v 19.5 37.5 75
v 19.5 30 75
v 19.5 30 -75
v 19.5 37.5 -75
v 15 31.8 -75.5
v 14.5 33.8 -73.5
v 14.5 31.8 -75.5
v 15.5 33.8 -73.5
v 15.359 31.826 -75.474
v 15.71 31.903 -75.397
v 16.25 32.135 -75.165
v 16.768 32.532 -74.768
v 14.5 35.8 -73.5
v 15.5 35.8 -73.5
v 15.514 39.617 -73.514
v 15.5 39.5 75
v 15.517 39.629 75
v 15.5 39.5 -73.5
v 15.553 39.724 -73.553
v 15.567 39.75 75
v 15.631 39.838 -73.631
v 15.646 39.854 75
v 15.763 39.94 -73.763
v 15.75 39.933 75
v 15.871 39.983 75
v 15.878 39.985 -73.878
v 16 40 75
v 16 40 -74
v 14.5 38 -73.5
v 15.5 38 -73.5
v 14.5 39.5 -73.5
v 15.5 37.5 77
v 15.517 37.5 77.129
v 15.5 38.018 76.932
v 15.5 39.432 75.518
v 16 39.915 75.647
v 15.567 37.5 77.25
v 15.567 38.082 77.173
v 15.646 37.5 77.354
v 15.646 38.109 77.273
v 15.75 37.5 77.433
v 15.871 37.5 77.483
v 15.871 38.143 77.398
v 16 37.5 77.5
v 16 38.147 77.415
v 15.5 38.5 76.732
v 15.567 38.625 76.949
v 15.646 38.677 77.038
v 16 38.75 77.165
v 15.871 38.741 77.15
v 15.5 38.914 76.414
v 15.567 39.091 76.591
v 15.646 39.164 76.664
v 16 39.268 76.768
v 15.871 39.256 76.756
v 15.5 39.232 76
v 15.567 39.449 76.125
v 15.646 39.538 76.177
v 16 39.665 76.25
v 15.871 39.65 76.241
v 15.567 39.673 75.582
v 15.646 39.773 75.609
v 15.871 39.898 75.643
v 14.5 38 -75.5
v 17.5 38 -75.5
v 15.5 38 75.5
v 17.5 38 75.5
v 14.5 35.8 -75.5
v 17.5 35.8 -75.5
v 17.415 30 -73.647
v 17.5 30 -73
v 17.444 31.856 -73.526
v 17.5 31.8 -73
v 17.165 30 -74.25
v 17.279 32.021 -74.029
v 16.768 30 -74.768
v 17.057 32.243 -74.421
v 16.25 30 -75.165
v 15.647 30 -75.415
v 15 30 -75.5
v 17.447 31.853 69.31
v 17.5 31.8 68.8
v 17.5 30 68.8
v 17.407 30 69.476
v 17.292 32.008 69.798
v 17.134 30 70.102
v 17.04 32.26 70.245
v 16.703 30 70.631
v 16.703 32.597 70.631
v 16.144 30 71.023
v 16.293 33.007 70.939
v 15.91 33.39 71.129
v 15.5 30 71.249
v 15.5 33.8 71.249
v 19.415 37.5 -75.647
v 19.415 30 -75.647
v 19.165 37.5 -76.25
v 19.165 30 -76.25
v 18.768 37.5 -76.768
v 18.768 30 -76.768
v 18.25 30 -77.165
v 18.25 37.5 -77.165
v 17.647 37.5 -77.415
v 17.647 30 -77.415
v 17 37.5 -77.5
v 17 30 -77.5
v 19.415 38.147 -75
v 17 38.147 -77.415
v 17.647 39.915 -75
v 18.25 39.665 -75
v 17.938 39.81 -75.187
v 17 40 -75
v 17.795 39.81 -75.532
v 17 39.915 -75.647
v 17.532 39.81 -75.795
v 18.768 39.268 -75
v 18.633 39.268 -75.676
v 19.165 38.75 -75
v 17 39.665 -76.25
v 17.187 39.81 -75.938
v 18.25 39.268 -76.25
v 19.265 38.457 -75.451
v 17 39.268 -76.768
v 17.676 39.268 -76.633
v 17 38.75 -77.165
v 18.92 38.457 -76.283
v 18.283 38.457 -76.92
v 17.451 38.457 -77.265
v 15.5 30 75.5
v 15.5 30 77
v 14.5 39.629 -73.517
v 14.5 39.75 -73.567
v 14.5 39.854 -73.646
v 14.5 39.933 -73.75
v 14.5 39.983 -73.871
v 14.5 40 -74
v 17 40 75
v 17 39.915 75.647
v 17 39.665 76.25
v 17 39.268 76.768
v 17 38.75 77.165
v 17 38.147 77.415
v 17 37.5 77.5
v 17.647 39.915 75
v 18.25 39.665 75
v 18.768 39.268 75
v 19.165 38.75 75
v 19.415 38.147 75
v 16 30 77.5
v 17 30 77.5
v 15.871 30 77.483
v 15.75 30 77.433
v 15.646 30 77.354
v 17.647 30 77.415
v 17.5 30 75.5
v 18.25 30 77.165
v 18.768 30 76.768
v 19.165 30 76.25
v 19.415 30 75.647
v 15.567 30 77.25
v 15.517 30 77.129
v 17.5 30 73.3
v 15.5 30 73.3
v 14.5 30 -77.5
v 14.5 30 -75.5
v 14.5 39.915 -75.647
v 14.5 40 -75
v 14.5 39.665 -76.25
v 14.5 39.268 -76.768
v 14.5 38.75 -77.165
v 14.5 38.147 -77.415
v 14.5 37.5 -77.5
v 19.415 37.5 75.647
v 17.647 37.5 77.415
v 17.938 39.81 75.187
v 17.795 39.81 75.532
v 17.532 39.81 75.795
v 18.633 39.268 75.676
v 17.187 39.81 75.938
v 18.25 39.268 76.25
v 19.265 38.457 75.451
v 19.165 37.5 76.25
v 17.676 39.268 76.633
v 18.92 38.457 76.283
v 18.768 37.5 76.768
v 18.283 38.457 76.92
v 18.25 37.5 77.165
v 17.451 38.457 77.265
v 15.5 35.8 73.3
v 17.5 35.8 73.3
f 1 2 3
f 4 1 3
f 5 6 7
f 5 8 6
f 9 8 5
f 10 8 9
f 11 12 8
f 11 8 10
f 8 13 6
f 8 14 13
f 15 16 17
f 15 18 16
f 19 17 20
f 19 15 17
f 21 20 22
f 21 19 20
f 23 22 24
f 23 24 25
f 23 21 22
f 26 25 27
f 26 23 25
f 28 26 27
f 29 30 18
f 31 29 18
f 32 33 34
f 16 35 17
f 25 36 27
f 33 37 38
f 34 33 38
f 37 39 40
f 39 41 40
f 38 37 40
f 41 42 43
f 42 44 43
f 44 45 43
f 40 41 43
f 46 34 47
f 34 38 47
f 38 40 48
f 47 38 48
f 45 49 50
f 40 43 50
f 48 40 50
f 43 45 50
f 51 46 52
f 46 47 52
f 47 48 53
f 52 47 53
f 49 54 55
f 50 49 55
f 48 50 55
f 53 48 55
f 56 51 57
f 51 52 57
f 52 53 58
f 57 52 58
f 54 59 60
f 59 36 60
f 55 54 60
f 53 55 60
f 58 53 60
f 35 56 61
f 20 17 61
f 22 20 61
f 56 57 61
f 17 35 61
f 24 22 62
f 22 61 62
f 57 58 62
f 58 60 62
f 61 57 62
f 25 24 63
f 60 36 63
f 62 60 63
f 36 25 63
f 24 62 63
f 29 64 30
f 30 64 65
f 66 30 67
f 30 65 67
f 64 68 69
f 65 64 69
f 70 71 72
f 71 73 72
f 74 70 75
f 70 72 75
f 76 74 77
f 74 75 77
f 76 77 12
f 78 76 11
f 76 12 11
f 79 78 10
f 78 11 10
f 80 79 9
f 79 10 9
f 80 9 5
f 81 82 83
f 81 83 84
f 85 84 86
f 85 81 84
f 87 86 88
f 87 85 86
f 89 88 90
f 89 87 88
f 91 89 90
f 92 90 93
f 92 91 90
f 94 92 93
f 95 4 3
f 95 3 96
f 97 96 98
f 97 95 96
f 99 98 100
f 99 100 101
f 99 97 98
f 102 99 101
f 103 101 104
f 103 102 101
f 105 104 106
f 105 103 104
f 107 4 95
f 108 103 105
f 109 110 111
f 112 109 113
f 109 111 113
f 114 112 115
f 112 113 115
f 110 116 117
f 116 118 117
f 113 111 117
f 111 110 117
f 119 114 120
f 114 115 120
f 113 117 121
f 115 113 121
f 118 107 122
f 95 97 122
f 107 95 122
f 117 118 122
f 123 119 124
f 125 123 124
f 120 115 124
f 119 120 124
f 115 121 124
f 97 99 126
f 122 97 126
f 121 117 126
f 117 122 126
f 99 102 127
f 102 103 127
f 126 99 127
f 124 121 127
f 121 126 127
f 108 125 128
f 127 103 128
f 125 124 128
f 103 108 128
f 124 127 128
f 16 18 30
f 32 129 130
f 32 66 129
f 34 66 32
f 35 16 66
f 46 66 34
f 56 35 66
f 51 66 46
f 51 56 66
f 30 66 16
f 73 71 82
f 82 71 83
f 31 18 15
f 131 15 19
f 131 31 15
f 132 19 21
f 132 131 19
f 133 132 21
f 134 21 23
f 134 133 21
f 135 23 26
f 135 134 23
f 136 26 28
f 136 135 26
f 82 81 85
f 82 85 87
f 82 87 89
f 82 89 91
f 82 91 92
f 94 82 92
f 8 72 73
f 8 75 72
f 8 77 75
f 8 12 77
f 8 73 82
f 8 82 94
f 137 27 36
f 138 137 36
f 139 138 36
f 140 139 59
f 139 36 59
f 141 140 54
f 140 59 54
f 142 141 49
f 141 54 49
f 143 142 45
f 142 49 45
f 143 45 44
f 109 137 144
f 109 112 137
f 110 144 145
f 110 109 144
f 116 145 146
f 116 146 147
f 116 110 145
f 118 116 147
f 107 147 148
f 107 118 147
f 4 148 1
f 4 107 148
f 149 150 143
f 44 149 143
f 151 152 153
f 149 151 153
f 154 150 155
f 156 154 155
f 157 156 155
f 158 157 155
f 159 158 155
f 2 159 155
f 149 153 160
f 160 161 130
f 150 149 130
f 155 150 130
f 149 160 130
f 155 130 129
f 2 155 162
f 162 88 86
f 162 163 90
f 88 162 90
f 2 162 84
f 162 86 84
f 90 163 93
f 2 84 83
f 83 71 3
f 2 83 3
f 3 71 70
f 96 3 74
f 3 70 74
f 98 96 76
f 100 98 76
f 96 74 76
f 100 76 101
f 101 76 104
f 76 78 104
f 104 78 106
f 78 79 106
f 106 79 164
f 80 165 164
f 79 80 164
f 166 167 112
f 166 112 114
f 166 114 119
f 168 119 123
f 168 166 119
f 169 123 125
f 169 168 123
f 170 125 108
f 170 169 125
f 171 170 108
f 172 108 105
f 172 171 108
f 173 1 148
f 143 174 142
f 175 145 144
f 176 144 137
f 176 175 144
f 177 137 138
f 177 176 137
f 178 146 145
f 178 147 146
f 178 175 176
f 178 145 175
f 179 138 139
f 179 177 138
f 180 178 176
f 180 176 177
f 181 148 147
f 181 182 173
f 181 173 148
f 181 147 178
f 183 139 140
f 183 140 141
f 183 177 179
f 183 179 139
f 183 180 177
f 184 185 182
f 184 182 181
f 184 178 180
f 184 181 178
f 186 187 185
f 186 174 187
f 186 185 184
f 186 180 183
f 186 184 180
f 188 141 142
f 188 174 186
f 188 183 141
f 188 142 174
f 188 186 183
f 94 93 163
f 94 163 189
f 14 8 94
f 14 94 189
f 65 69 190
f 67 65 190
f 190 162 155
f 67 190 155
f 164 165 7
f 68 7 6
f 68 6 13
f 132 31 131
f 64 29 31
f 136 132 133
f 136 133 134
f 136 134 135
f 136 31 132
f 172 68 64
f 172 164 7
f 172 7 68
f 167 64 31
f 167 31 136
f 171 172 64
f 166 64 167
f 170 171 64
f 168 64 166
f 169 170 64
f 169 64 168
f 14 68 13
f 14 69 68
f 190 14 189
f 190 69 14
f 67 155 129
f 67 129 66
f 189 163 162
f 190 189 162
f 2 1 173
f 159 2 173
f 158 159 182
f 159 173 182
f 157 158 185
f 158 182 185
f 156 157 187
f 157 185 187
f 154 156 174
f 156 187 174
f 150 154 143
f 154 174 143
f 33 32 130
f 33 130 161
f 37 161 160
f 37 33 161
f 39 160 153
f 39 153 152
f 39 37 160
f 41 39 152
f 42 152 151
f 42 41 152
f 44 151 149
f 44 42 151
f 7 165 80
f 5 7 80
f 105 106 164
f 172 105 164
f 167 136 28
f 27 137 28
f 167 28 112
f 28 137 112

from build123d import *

# Parameters (mm, degrees)
SKETCH1_W                       = 39
SKETCH1_H                       = 155
BOSS_EXTRUDE1_DEPTH             = 2
BOSS_EXTRUDE2_DEPTH             = 38
SKETCH3_W                       = 2
SKETCH3_H                       = 2
BOSS_EXTRUDE3_DEPTH             = 38
SKETCH4_W                       = 2
SKETCH4_H                       = 2
BOSS_EXTRUDE4_DEPTH             = 151
SKETCH6_W                       = 35
SKETCH6_H                       = 2.2
CUT_EXTRUDE1_DEPTH              = 160.340045186
SKETCH7_W                       = 35
SKETCH7_H                       = 2.2
CUT_EXTRUDE2_DEPTH              = 89.490112442
SKETCH5_W                       = 31
SKETCH5_H                       = 2
BOSS_EXTRUDE5_DEPTH             = 2
BOSS_EXTRUDE6_REACH             = 91.367
SKETCH8_W                       = 2
SKETCH8_H                       = 2
BOSS_EXTRUDE6_DIRECTION_2_REACH = 91.367
SKETCH10_W                      = 2
SKETCH10_H                      = 2.2
SKETCH10_W_2                    = 2.2
SKETCH10_H_2                    = 2
BOSS_EXTRUDE8_DEPTH             = 2
SKETCH11_W                      = 2
SKETCH11_H                      = 2.2
SKETCH11_W_2                    = 2.2
SKETCH11_H_2                    = 2
BOSS_EXTRUDE9_DEPTH             = 2
FILLET2_R                       = 2.5
SKETCH14_W                      = 36.5
SKETCH14_H                      = 7.75
BOSS_EXTRUDE10_DEPTH            = 2
SKETCH13_W                      = 31
SKETCH13_H                      = 3
CUT_EXTRUDE4_DEPTH              = 2
FILLET3_R                       = 2
FILLET4_R                       = 0.5
SKETCH15_R                      = 5.1
CUT_EXTRUDE5_DEPTH              = 90.367219941
SKETCH16_R                      = 7.1
BOSS_EXTRUDE11_DEPTH            = 1
FILLET5_R                       = 0.5
CUT_EXTRUDE3_DEPTH              = 160.340045186
FILLET6_R                       = 0.4
FILLET7_R                       = 0.5
CUT_EXTRUDE6_DEPTH              = 6
SKETCH18_W                      = 29
SKETCH18_H                      = 3
CUT_EXTRUDE8_DEPTH              = 90.367220028
CUT_EXTRUDE11_DEPTH             = 90.367220028
CUT_EXTRUDE11_DEPTH_BACK        = 90.367220028
SKETCH20_W                      = 29
SKETCH20_H                      = 34
SKETCH21_W                      = 155
SKETCH21_H                      = 20
SKETCH21_H_2                    = 10
CUT_EXTRUDE12_DEPTH             = 90.367219941


with BuildPart() as part:
    # Sketch1 → Boss-Extrude1 (new body)
    with BuildSketch(Plane(origin=(0, 0, 0), x_dir=(1, 0, 0), z_dir=(0, 1, 0))):
        Rectangle(SKETCH1_W, SKETCH1_H)
    extrude(amount=BOSS_EXTRUDE1_DEPTH)

    # Sketch2 → Boss-Extrude2 (add)
    with BuildSketch(Plane(origin=(0, 2, 0), x_dir=(1, 0, 0), z_dir=(0, 1, 0))):
        Polygon((-17.5, -77.5), (-17.5, -75.5), (-17.5, 75.5), (17.5, 75.5), (17.5, -75.5), (17.5, -77.5), (19.5, -77.5), (19.5, 77.5), (-19.5, 77.5), (-19.5, -77.5), align=None)
    extrude(amount=BOSS_EXTRUDE2_DEPTH)

    # Sketch3 → Boss-Extrude3 (add)
    with BuildSketch(Plane(origin=(0, 2, 0), x_dir=(1, 0, 0), z_dir=(0, 1, 0))):
        with Locations((-16.5, -76.5)):
            Rectangle(SKETCH3_W, SKETCH3_H)
        with Locations((-16.5, -72.3)):
            Rectangle(SKETCH3_W, SKETCH3_H)
        with Locations((16.5, -76.5)):
            Rectangle(SKETCH3_W, SKETCH3_H)
        with Locations((16.5, -72.3)):
            Rectangle(SKETCH3_W, SKETCH3_H)
    extrude(amount=BOSS_EXTRUDE3_DEPTH)

    # Sketch4 → Boss-Extrude4 (add)
    with BuildSketch(Plane.XY.offset(-75.5)):
        with Locations((-16.5, 39)):
            Rectangle(SKETCH4_W, SKETCH4_H)
        Polygon((-15.5, 33.8), (-17.5, 31.8), (-17.5, 35.8), (-15.5, 35.8), align=None)
        Polygon((15.5, 35.8), (17.5, 35.8), (17.5, 31.8), (15.5, 33.8), align=None)
        with Locations((16.5, 39)):
            Rectangle(SKETCH4_W, SKETCH4_H)
    extrude(amount=BOSS_EXTRUDE4_DEPTH)

    # Sketch6 → Cut-Extrude1 (cut, through all)
    with BuildSketch(Plane.XY.offset(-75.5)):
        with Locations((0, 36.9)):
            Rectangle(SKETCH6_W, SKETCH6_H)
    extrude(amount=CUT_EXTRUDE1_DEPTH, mode=Mode.SUBTRACT)

    # Sketch7 → Cut-Extrude2 (cut, through all)
    with BuildSketch(Plane(origin=(0, 2, 0), x_dir=(1, 0, 0), z_dir=(0, 1, 0))):
        with Locations((0, -74.4)):
            Rectangle(SKETCH7_W, SKETCH7_H)
    extrude(amount=CUT_EXTRUDE2_DEPTH, mode=Mode.SUBTRACT)

    # Sketch5 → Boss-Extrude5 (add)
    with BuildSketch(Plane(origin=(0, 2, 0), x_dir=(1, 0, 0), z_dir=(0, 1, 0))):
        with Locations((0, -76.5)):
            Rectangle(SKETCH5_W, SKETCH5_H)
        with Locations((0, -72.3)):
            Rectangle(SKETCH5_W, SKETCH5_H)
    extrude(amount=BOSS_EXTRUDE5_DEPTH)

    # Boss-Extrude6: up to this face of the body (flat: up to its plane)
    boss_extrude6_end = Plane(part.part.faces().sort_by_distance((17.5, 16.9, -2.1))[0])
    # Sketch8 → Boss-Extrude6 (add, up to the picked face)
    with BuildSketch(Plane(origin=(0, 0, 0), x_dir=(0, 0, -1), z_dir=(1, 0, 0)), mode=Mode.PRIVATE) as boss_extrude6_sk1:
        with Locations((74.5, 39)):
            Rectangle(SKETCH8_W, SKETCH8_H)
    boss_extrude6_tool1 = split(extrude(boss_extrude6_sk1.sketch, amount=BOSS_EXTRUDE6_REACH, mode=Mode.PRIVATE), bisect_by=boss_extrude6_end, keep=Keep.BOTH, mode=Mode.PRIVATE)
    # Sketch8 → Boss-Extrude6 (add, up to the picked face)
    with BuildSketch(Plane(origin=(0, 0, 0), x_dir=(0, 0, -1), z_dir=(1, 0, 0)), mode=Mode.PRIVATE) as boss_extrude6_sk2:
        Polygon((75.5, 35.8), (73.5, 35.8), (73.5, 33.8), (75.5, 31.8), align=None)
    boss_extrude6_tool2 = split(extrude(boss_extrude6_sk2.sketch, amount=BOSS_EXTRUDE6_REACH, mode=Mode.PRIVATE), bisect_by=boss_extrude6_end, keep=Keep.BOTH, mode=Mode.PRIVATE)
    add(boss_extrude6_tool1.solids().sort_by(Axis((0, 39, -74.5), (1, 0, 0)))[0])
    add(boss_extrude6_tool2.solids().sort_by(Axis((0, 34.244444, -74.611111), (1, 0, 0)))[0])

    # Boss-Extrude6 direction 2: up to this face of the body (flat: up to its plane)
    boss_extrude6_direction_2_end = Plane(part.part.faces().sort_by_distance((-17.5, 16.9, -2.1))[0])
    # Sketch8 → Boss-Extrude6 direction 2 (add, up to the picked face)
    with BuildSketch(Plane(origin=(0, 0, 0), x_dir=(0, 0, -1), z_dir=(1, 0, 0)), mode=Mode.PRIVATE) as boss_extrude6_direction_2_sk1:
        with Locations((74.5, 39)):
            Rectangle(SKETCH8_W, SKETCH8_H)
    boss_extrude6_direction_2_tool1 = split(extrude(boss_extrude6_direction_2_sk1.sketch, amount=-BOSS_EXTRUDE6_DIRECTION_2_REACH, mode=Mode.PRIVATE), bisect_by=boss_extrude6_direction_2_end, keep=Keep.BOTH, mode=Mode.PRIVATE)
    # Sketch8 → Boss-Extrude6 direction 2 (add, up to the picked face)
    with BuildSketch(Plane(origin=(0, 0, 0), x_dir=(0, 0, -1), z_dir=(1, 0, 0)), mode=Mode.PRIVATE) as boss_extrude6_direction_2_sk2:
        Polygon((75.5, 35.8), (73.5, 35.8), (73.5, 33.8), (75.5, 31.8), align=None)
    boss_extrude6_direction_2_tool2 = split(extrude(boss_extrude6_direction_2_sk2.sketch, amount=-BOSS_EXTRUDE6_DIRECTION_2_REACH, mode=Mode.PRIVATE), bisect_by=boss_extrude6_direction_2_end, keep=Keep.BOTH, mode=Mode.PRIVATE)
    add(boss_extrude6_direction_2_tool1.solids().sort_by(Axis((0, 39, -74.5), (-1, 0, 0)))[0])
    add(boss_extrude6_direction_2_tool2.solids().sort_by(Axis((0, 34.244444, -74.611111), (-1, 0, 0)))[0])

    # Sketch10 → Boss-Extrude8 (add)
    with BuildSketch(Plane(origin=(-17.5, 0, 0), x_dir=(0, 0, -1), z_dir=(1, 0, 0))):
        with Locations((-76.5, 36.9)):
            Rectangle(SKETCH10_W, SKETCH10_H)
        with Locations((-74.4, 39)):
            Rectangle(SKETCH10_W_2, SKETCH10_H_2)
    extrude(amount=BOSS_EXTRUDE8_DEPTH)

    # Sketch11 → Boss-Extrude9 (add)
    with BuildSketch(Plane.ZY.offset(-17.5)):
        with Locations((76.5, 36.9)):
            Rectangle(SKETCH11_W, SKETCH11_H)
        with Locations((74.4, 39)):
            Rectangle(SKETCH11_W_2, SKETCH11_H_2)
    extrude(amount=BOSS_EXTRUDE9_DEPTH)

    # Fillet2
    fillet2_edges = [part.edges().sort_by_distance(p)[0] for p in [
        (-17.5, 16.9, 71.3),
        (17.5, 16.9, 71.3),
        (19.5, 20, 77.5),
        (-19.5, 20, 77.5),
        (-19.5, 20, -77.5),
        (-17.5, 16.9, -75.5),
        (17.5, 16.9, -75.5),
        (19.5, 20, -77.5),
        (19.5, 40, 0),
        (-19.5, 40, 0),
        (19.5, 0, 0),
        (-19.5, 0, 0),
        (0, 40, -77.5),
        (0, 0, 77.5),
        (0, 0, -77.5),
        (-17.5, 40, 77.5),
        (17.5, 40, 77.5),
    ]]
    fillet(fillet2_edges, radius=FILLET2_R)

    # Sketch14 → Boss-Extrude10 (add)
    with BuildSketch(Plane.XY.offset(-75.5)):
        with Locations((0, 5.125)):
            Rectangle(SKETCH14_W, SKETCH14_H)
    extrude(amount=BOSS_EXTRUDE10_DEPTH)

    # Sketch13 → Cut-Extrude4 (cut)
    with BuildSketch(Plane(origin=(0, 0, -77.5), x_dir=(-1, 0, 0), z_dir=(0, 0, -1))):
        with Locations((0, 5.5)):
            Rectangle(SKETCH13_W, SKETCH13_H)
    extrude(amount=-CUT_EXTRUDE4_DEPTH, mode=Mode.SUBTRACT)

    # Fillet3
    fillet3_edges = [part.edges().sort_by_distance(p)[0] for p in [
        (0, 9, -73.5),
    ]]
    fillet(fillet3_edges, radius=FILLET3_R - 0.0001)  # a hair under: the kernel refuses the full size

    # Fillet4
    fillet4_edges = [part.edges().sort_by_distance(p)[0] for p in [
        (15.5, 5.5, -75.5),
        (15.5, 4, -76.5),
        (0, 7, -75.5),
        (15.5, 7, -76.5),
        (-15.5, 5.5, -75.5),
        (-15.5, 7, -76.5),
        (0, 4, -75.5),
        (-15.5, 4, -76.5),
        (15.5, 5.5, -77.5),
        (0, 4, -77.5),
        (-15.5, 5.5, -77.5),
        (0, 7, -77.5),
    ]]
    fillet(fillet4_edges, radius=FILLET4_R)

    # Sketch15 → Cut-Extrude5 (cut, through all)
    with BuildSketch(Plane.XZ):
        with Locations(Location((0, 38.75, 0), (0, 0, 270))):
            Circle(SKETCH15_R)
        with Locations(Location((0, -38.75, 0), (0, 0, 270))):
            Circle(SKETCH15_R)
    extrude(amount=-CUT_EXTRUDE5_DEPTH, mode=Mode.SUBTRACT)

    # Sketch16 → Boss-Extrude11 (add)
    with BuildSketch(Plane(origin=(0, 2, 0), x_dir=(1, 0, 0), z_dir=(0, 1, 0))):
        with Locations(Location((0, 38.75, 0), (0, 0, 270))):
            Circle(SKETCH16_R)
        with Locations(Location((0, -38.75, 0), (0, 0, 270))):
            Circle(SKETCH16_R)
    extrude(amount=BOSS_EXTRUDE11_DEPTH)

    # Fillet5
    fillet5_edges = [part.edges().sort_by_distance(p)[0] for p in [
        (0, 2, -45.85),
        (0, 3, -45.85),
        (0, 2, 31.65),
        (0, 3, 31.65),
    ]]
    fillet(fillet5_edges, radius=FILLET5_R - 0.0001)  # a hair under: the kernel refuses the full size

    # Sketch12 → Cut-Extrude3 (cut, through all)
    with BuildSketch(Plane.XY.offset(-75.5)):
        with BuildLine():
            Line((1.668907005, 12.688040659), (2.22520934, 10.250720878))
            ThreePointArc((2.22520934, 10.250720878), (4.338837391, 10.990311321), (6.234898019, 12.181685175))
            Line((6.234898019, 12.181685175), (4.676173514, 14.136263881))
            ThreePointArc((4.676173514, 14.136263881), (3.254128043, 13.242733491), (1.668907005, 12.688040659))
        make_face()
        with BuildLine():
            ThreePointArc((-6.234898019, 12.181685175), (-4.338837391, 10.990311321), (-2.22520934, 10.250720878))
            Line((-2.22520934, 10.250720878), (-1.668907005, 12.688040659))
            ThreePointArc((-1.668907005, 12.688040659), (-3.254128043, 13.242733491), (-4.676173514, 14.136263881))
            Line((-4.676173514, 14.136263881), (-6.234898019, 12.181685175))
        make_face()
        with BuildLine():
            ThreePointArc((-10, 20), (-9.749279122, 17.77479066), (-9.009688679, 15.661162609))
            Line((-9.009688679, 15.661162609), (-6.757266509, 16.745871957))
            ThreePointArc((-6.757266509, 16.745871957), (-7.311959341, 18.331092995), (-7.5, 20))
            Line((-7.5, 20), (-10, 20))
        make_face()
        with BuildLine():
            ThreePointArc((-6.234898019, 27.818314825), (-7.818314825, 26.234898019), (-9.009688679, 24.338837391))
            Line((-9.009688679, 24.338837391), (-6.757266509, 23.254128043))
            ThreePointArc((-6.757266509, 23.254128043), (-5.863736119, 24.676173514), (-4.676173514, 25.863736119))
            Line((-4.676173514, 25.863736119), (-6.234898019, 27.818314825))
        make_face()
        with BuildLine():
            ThreePointArc((-1.668907005, 27.311959341), (-0.839733571, 27.452841574), (0, 27.5))
            Line((0, 27.5), (0, 30))
            ThreePointArc((0, 30), (-1.119644761, 29.937122099), (-2.22520934, 29.749279122))
            Line((-2.22520934, 29.749279122), (-1.668907005, 27.311959341))
        make_face()
        with BuildLine():
            Line((0, 30), (0, 27.5))
            ThreePointArc((0, 27.5), (0.839733571, 27.452841574), (1.668907005, 27.311959341))
            Line((1.668907005, 27.311959341), (2.22520934, 29.749279122))
            ThreePointArc((2.22520934, 29.749279122), (1.119644761, 29.937122099), (0, 30))
        make_face()
        with BuildLine():
            Line((6.757266509, 23.254128043), (9.009688679, 24.338837391))
            ThreePointArc((9.009688679, 24.338837391), (7.818314825, 26.234898019), (6.234898019, 27.818314825))
            Line((6.234898019, 27.818314825), (4.676173514, 25.863736119))
            ThreePointArc((4.676173514, 25.863736119), (5.863736119, 24.676173514), (6.757266509, 23.254128043))
        make_face()
        with BuildLine():
            Line((6.757266509, 16.745871957), (9.009688679, 15.661162609))
            ThreePointArc((9.009688679, 15.661162609), (9.749279122, 17.77479066), (10, 20))
            Line((10, 20), (7.5, 20))
            ThreePointArc((7.5, 20), (7.311959341, 18.331092995), (6.757266509, 16.745871957))
        make_face()
        with BuildLine():
            ThreePointArc((2.5, 20), (2.43731978, 19.443697665), (2.25242217, 18.915290652))
            Line((2.25242217, 18.915290652), (4.50484434, 17.830581304))
            ThreePointArc((4.50484434, 17.830581304), (4.874639561, 18.88739533), (5, 20))
            Line((5, 20), (2.5, 20))
        make_face()
        with BuildLine():
            ThreePointArc((1.558724505, 21.954578706), (1.954578706, 21.558724505), (2.25242217, 21.084709348))
            Line((2.25242217, 21.084709348), (4.50484434, 22.169418696))
            ThreePointArc((4.50484434, 22.169418696), (3.909157412, 23.117449009), (3.117449009, 23.909157412))
            Line((3.117449009, 23.909157412), (1.558724505, 21.954578706))
        make_face()
        with BuildLine():
            Line((0, 25), (0, 22.5))
            ThreePointArc((0, 22.5), (0.27991119, 22.484280525), (0.556302335, 22.43731978))
            Line((0.556302335, 22.43731978), (1.11260467, 24.874639561))
            ThreePointArc((1.11260467, 24.874639561), (0.559822381, 24.968561049), (0, 25))
        make_face()
        with BuildLine():
            ThreePointArc((-0.556302335, 22.43731978), (-0.27991119, 22.484280525), (0, 22.5))
            Line((0, 22.5), (0, 25))
            ThreePointArc((0, 25), (-0.559822381, 24.968561049), (-1.11260467, 24.874639561))
            Line((-1.11260467, 24.874639561), (-0.556302335, 22.43731978))
        make_face()
        with BuildLine():
            ThreePointArc((-2.25242217, 21.084709348), (-1.954578706, 21.558724505), (-1.558724505, 21.954578706))
            Line((-1.558724505, 21.954578706), (-3.117449009, 23.909157412))
            ThreePointArc((-3.117449009, 23.909157412), (-3.909157412, 23.117449009), (-4.50484434, 22.169418696))
            Line((-4.50484434, 22.169418696), (-2.25242217, 21.084709348))
        make_face()
        with BuildLine():
            ThreePointArc((-2.25242217, 18.915290652), (-2.43731978, 19.443697665), (-2.5, 20))
            Line((-2.5, 20), (-5, 20))
            ThreePointArc((-5, 20), (-4.874639561, 18.88739533), (-4.50484434, 17.830581304))
            Line((-4.50484434, 17.830581304), (-2.25242217, 18.915290652))
        make_face()
        with BuildLine():
            ThreePointArc((-3.117449009, 16.090842588), (-2.169418696, 15.49515566), (-1.11260467, 15.125360439))
            Line((-1.11260467, 15.125360439), (-0.556302335, 17.56268022))
            ThreePointArc((-0.556302335, 17.56268022), (-1.084709348, 17.74757783), (-1.558724505, 18.045421294))
            Line((-1.558724505, 18.045421294), (-3.117449009, 16.090842588))
        make_face()
        with BuildLine():
            Line((0.556302335, 17.56268022), (1.11260467, 15.125360439))
            ThreePointArc((1.11260467, 15.125360439), (2.169418696, 15.49515566), (3.117449009, 16.090842588))
            Line((3.117449009, 16.090842588), (1.558724505, 18.045421294))
            ThreePointArc((1.558724505, 18.045421294), (1.084709348, 17.74757783), (0.556302335, 17.56268022))
        make_face()
    extrude(amount=-CUT_EXTRUDE3_DEPTH, mode=Mode.SUBTRACT)

    # Fillet6
    fillet6_edges = [part.edges().sort_by_distance(p)[0] for p in [
        (5.863736119, 24.676173514, -75.5),
        (5.455535766, 26.841025472, -75.5),
        (7.818314825, 26.234898019, -77.5),
        (7.883477594, 23.796482717, -77.5),
        (5.863736119, 24.676173514, -77.5),
        (5.455535766, 26.841025472, -77.5),
        (7.883477594, 23.796482717, -75.5),
        (7.818314825, 26.234898019, -75.5),
        (7.311959341, 18.331092995, -75.5),
        (8.75, 20, -75.5),
        (9.749279122, 17.77479066, -77.5),
        (7.883477594, 16.203517283, -77.5),
        (7.311959341, 18.331092995, -77.5),
        (8.75, 20, -77.5),
        (7.883477594, 16.203517283, -75.5),
        (9.749279122, 17.77479066, -75.5),
        (2.43731978, 19.443697665, -75.5),
        (3.75, 20, -75.5),
        (4.874639561, 18.88739533, -77.5),
        (3.378633255, 18.372935978, -77.5),
        (2.43731978, 19.443697665, -77.5),
        (3.75, 20, -77.5),
        (3.378633255, 18.372935978, -75.5),
        (4.874639561, 18.88739533, -75.5),
        (1.954578706, 21.558724505, -75.5),
        (2.338086757, 22.931868059, -75.5),
        (3.909157412, 23.117449009, -77.5),
        (3.378633255, 21.627064022, -77.5),
        (1.954578706, 21.558724505, -77.5),
        (2.338086757, 22.931868059, -77.5),
        (3.378633255, 21.627064022, -75.5),
        (3.909157412, 23.117449009, -75.5),
        (0, 27.5, -75.5),
        (-1.947058172, 28.530619232, -75.5),
        (0, 30, -77.5),
        (1.947058172, 28.530619232, -77.5),
        (0, 27.5, -77.5),
        (-1.947058172, 28.530619232, -77.5),
        (1.947058172, 28.530619232, -75.5),
        (0, 30, -75.5),
        (-5.863736119, 24.676173514, -75.5),
        (-7.883477594, 23.796482717, -75.5),
        (-7.818314825, 26.234898019, -77.5),
        (-5.455535766, 26.841025472, -77.5),
        (-5.863736119, 24.676173514, -77.5),
        (-7.883477594, 23.796482717, -77.5),
        (-5.455535766, 26.841025472, -75.5),
        (-7.818314825, 26.234898019, -75.5),
        (-7.311959341, 18.331092995, -75.5),
        (-7.883477594, 16.203517283, -75.5),
        (-9.749279122, 17.77479066, -77.5),
        (-8.75, 20, -77.5),
        (-7.311959341, 18.331092995, -77.5),
        (-7.883477594, 16.203517283, -77.5),
        (-8.75, 20, -75.5),
        (-9.749279122, 17.77479066, -75.5),
        (-3.254128043, 13.242733491, -75.5),
        (-1.947058172, 11.469380768, -75.5),
        (-4.338837391, 10.990311321, -77.5),
        (-5.455535766, 13.158974528, -77.5),
        (-3.254128043, 13.242733491, -77.5),
        (-1.947058172, 11.469380768, -77.5),
        (-5.455535766, 13.158974528, -75.5),
        (-4.338837391, 10.990311321, -75.5),
        (1.084709348, 17.74757783, -75.5),
        (2.338086757, 17.068131941, -75.5),
        (2.169418696, 15.49515566, -77.5),
        (0.834453502, 16.344020329, -77.5),
        (1.084709348, 17.74757783, -77.5),
        (2.338086757, 17.068131941, -77.5),
        (0.834453502, 16.344020329, -75.5),
        (2.169418696, 15.49515566, -75.5),
        (-2.43731978, 19.443697665, -75.5),
        (-3.378633255, 18.372935978, -75.5),
        (-4.874639561, 18.88739533, -77.5),
        (-3.75, 20, -77.5),
        (-2.43731978, 19.443697665, -77.5),
        (-3.378633255, 18.372935978, -77.5),
        (-3.75, 20, -75.5),
        (-4.874639561, 18.88739533, -75.5),
        (-1.084709348, 17.74757783, -75.5),
        (-0.834453502, 16.344020329, -75.5),
        (-2.169418696, 15.49515566, -77.5),
        (-2.338086757, 17.068131941, -77.5),
        (-1.084709348, 17.74757783, -77.5),
        (-0.834453502, 16.344020329, -77.5),
        (-2.338086757, 17.068131941, -75.5),
        (-2.169418696, 15.49515566, -75.5),
        (-1.954578706, 21.558724505, -75.5),
        (-3.378633255, 21.627064022, -75.5),
        (-3.909157412, 23.117449009, -77.5),
        (-2.338086757, 22.931868059, -77.5),
        (-1.954578706, 21.558724505, -77.5),
        (-3.378633255, 21.627064022, -77.5),
        (-2.338086757, 22.931868059, -75.5),
        (-3.909157412, 23.117449009, -75.5),
        (0, 25, -77.5),
        (0.834453502, 23.655979671, -77.5),
        (0, 22.5, -75.5),
        (-0.834453502, 23.655979671, -75.5),
        (0, 22.5, -77.5),
        (-0.834453502, 23.655979671, -77.5),
        (0, 25, -75.5),
        (0.834453502, 23.655979671, -75.5),
        (3.254128043, 13.242733491, -75.5),
        (5.455535766, 13.158974528, -75.5),
        (4.338837391, 10.990311321, -77.5),
        (1.947058172, 11.469380768, -77.5),
        (3.254128043, 13.242733491, -77.5),
        (5.455535766, 13.158974528, -77.5),
        (1.947058172, 11.469380768, -75.5),
        (4.338837391, 10.990311321, -75.5),
    ]]
    fillet(fillet6_edges, radius=FILLET6_R)

    # Fillet7
    fillet7_edges = [part.edges().sort_by_distance(p)[0] for p in [
        (15.5, 40, 0.75),
        (0, 4, 77.5),
        (0, 40, -73.5),
        (-15.5, 40, 0.75),
        (-15.5, 20.75, 77.5),
        (-15.5, 39.267766953, 76.767766953),
        (15.5, 20.75, 77.5),
        (15.5, 39.267766953, 76.767766953),
    ]]
    fillet(fillet7_edges, radius=FILLET7_R)

    # Sketch17 → Cut-Extrude6 (cut)
    with BuildSketch(Plane.XZ):
        Polygon((-17, -77.5), (-17, 70.299999999), (-14.999999999, 71.3), (-14.999999999, 77.5), (14.999999999, 77.5), (14.999999999, 71.3), (17, 70.299999999), (17, -77.5), align=None)
    extrude(amount=-CUT_EXTRUDE6_DEPTH, mode=Mode.SUBTRACT)

    # Sketch18 → Cut-Extrude8 (cut, through all)
    with BuildSketch(Plane.XY):
        with Locations((0, 7.5)):
            Rectangle(SKETCH18_W, SKETCH18_H)
    extrude(amount=-CUT_EXTRUDE8_DEPTH, mode=Mode.SUBTRACT)

    # Sketch20 → Cut-Extrude11 (cut, two sides: drawn at the far end of the back side and taken through both)
    with BuildSketch(Plane.XY.offset(-CUT_EXTRUDE11_DEPTH_BACK)):
        with Locations((0, 23)):
            Rectangle(SKETCH20_W, SKETCH20_H)
    extrude(amount=CUT_EXTRUDE11_DEPTH + CUT_EXTRUDE11_DEPTH_BACK, mode=Mode.SUBTRACT)


with BuildPart() as body_2:
    # of the pieces the cut leaves, the one that is kept (cut_extrude11_keep)
    add(part.part.solids().sort_by_distance((14.5, 40, -75))[0])

    # Sketch21 → Cut-Extrude12 (cut, through all)
    with BuildSketch(Plane(origin=(0, 0, 0), x_dir=(0, 0, -1), z_dir=(1, 0, 0))):
        with Locations((0, 20)):
            Rectangle(SKETCH21_W, SKETCH21_H)
        with Locations((0, 5)):
            Rectangle(SKETCH21_W, SKETCH21_H_2)
    extrude(amount=CUT_EXTRUDE12_DEPTH, mode=Mode.SUBTRACT)


solid = body_2.part
